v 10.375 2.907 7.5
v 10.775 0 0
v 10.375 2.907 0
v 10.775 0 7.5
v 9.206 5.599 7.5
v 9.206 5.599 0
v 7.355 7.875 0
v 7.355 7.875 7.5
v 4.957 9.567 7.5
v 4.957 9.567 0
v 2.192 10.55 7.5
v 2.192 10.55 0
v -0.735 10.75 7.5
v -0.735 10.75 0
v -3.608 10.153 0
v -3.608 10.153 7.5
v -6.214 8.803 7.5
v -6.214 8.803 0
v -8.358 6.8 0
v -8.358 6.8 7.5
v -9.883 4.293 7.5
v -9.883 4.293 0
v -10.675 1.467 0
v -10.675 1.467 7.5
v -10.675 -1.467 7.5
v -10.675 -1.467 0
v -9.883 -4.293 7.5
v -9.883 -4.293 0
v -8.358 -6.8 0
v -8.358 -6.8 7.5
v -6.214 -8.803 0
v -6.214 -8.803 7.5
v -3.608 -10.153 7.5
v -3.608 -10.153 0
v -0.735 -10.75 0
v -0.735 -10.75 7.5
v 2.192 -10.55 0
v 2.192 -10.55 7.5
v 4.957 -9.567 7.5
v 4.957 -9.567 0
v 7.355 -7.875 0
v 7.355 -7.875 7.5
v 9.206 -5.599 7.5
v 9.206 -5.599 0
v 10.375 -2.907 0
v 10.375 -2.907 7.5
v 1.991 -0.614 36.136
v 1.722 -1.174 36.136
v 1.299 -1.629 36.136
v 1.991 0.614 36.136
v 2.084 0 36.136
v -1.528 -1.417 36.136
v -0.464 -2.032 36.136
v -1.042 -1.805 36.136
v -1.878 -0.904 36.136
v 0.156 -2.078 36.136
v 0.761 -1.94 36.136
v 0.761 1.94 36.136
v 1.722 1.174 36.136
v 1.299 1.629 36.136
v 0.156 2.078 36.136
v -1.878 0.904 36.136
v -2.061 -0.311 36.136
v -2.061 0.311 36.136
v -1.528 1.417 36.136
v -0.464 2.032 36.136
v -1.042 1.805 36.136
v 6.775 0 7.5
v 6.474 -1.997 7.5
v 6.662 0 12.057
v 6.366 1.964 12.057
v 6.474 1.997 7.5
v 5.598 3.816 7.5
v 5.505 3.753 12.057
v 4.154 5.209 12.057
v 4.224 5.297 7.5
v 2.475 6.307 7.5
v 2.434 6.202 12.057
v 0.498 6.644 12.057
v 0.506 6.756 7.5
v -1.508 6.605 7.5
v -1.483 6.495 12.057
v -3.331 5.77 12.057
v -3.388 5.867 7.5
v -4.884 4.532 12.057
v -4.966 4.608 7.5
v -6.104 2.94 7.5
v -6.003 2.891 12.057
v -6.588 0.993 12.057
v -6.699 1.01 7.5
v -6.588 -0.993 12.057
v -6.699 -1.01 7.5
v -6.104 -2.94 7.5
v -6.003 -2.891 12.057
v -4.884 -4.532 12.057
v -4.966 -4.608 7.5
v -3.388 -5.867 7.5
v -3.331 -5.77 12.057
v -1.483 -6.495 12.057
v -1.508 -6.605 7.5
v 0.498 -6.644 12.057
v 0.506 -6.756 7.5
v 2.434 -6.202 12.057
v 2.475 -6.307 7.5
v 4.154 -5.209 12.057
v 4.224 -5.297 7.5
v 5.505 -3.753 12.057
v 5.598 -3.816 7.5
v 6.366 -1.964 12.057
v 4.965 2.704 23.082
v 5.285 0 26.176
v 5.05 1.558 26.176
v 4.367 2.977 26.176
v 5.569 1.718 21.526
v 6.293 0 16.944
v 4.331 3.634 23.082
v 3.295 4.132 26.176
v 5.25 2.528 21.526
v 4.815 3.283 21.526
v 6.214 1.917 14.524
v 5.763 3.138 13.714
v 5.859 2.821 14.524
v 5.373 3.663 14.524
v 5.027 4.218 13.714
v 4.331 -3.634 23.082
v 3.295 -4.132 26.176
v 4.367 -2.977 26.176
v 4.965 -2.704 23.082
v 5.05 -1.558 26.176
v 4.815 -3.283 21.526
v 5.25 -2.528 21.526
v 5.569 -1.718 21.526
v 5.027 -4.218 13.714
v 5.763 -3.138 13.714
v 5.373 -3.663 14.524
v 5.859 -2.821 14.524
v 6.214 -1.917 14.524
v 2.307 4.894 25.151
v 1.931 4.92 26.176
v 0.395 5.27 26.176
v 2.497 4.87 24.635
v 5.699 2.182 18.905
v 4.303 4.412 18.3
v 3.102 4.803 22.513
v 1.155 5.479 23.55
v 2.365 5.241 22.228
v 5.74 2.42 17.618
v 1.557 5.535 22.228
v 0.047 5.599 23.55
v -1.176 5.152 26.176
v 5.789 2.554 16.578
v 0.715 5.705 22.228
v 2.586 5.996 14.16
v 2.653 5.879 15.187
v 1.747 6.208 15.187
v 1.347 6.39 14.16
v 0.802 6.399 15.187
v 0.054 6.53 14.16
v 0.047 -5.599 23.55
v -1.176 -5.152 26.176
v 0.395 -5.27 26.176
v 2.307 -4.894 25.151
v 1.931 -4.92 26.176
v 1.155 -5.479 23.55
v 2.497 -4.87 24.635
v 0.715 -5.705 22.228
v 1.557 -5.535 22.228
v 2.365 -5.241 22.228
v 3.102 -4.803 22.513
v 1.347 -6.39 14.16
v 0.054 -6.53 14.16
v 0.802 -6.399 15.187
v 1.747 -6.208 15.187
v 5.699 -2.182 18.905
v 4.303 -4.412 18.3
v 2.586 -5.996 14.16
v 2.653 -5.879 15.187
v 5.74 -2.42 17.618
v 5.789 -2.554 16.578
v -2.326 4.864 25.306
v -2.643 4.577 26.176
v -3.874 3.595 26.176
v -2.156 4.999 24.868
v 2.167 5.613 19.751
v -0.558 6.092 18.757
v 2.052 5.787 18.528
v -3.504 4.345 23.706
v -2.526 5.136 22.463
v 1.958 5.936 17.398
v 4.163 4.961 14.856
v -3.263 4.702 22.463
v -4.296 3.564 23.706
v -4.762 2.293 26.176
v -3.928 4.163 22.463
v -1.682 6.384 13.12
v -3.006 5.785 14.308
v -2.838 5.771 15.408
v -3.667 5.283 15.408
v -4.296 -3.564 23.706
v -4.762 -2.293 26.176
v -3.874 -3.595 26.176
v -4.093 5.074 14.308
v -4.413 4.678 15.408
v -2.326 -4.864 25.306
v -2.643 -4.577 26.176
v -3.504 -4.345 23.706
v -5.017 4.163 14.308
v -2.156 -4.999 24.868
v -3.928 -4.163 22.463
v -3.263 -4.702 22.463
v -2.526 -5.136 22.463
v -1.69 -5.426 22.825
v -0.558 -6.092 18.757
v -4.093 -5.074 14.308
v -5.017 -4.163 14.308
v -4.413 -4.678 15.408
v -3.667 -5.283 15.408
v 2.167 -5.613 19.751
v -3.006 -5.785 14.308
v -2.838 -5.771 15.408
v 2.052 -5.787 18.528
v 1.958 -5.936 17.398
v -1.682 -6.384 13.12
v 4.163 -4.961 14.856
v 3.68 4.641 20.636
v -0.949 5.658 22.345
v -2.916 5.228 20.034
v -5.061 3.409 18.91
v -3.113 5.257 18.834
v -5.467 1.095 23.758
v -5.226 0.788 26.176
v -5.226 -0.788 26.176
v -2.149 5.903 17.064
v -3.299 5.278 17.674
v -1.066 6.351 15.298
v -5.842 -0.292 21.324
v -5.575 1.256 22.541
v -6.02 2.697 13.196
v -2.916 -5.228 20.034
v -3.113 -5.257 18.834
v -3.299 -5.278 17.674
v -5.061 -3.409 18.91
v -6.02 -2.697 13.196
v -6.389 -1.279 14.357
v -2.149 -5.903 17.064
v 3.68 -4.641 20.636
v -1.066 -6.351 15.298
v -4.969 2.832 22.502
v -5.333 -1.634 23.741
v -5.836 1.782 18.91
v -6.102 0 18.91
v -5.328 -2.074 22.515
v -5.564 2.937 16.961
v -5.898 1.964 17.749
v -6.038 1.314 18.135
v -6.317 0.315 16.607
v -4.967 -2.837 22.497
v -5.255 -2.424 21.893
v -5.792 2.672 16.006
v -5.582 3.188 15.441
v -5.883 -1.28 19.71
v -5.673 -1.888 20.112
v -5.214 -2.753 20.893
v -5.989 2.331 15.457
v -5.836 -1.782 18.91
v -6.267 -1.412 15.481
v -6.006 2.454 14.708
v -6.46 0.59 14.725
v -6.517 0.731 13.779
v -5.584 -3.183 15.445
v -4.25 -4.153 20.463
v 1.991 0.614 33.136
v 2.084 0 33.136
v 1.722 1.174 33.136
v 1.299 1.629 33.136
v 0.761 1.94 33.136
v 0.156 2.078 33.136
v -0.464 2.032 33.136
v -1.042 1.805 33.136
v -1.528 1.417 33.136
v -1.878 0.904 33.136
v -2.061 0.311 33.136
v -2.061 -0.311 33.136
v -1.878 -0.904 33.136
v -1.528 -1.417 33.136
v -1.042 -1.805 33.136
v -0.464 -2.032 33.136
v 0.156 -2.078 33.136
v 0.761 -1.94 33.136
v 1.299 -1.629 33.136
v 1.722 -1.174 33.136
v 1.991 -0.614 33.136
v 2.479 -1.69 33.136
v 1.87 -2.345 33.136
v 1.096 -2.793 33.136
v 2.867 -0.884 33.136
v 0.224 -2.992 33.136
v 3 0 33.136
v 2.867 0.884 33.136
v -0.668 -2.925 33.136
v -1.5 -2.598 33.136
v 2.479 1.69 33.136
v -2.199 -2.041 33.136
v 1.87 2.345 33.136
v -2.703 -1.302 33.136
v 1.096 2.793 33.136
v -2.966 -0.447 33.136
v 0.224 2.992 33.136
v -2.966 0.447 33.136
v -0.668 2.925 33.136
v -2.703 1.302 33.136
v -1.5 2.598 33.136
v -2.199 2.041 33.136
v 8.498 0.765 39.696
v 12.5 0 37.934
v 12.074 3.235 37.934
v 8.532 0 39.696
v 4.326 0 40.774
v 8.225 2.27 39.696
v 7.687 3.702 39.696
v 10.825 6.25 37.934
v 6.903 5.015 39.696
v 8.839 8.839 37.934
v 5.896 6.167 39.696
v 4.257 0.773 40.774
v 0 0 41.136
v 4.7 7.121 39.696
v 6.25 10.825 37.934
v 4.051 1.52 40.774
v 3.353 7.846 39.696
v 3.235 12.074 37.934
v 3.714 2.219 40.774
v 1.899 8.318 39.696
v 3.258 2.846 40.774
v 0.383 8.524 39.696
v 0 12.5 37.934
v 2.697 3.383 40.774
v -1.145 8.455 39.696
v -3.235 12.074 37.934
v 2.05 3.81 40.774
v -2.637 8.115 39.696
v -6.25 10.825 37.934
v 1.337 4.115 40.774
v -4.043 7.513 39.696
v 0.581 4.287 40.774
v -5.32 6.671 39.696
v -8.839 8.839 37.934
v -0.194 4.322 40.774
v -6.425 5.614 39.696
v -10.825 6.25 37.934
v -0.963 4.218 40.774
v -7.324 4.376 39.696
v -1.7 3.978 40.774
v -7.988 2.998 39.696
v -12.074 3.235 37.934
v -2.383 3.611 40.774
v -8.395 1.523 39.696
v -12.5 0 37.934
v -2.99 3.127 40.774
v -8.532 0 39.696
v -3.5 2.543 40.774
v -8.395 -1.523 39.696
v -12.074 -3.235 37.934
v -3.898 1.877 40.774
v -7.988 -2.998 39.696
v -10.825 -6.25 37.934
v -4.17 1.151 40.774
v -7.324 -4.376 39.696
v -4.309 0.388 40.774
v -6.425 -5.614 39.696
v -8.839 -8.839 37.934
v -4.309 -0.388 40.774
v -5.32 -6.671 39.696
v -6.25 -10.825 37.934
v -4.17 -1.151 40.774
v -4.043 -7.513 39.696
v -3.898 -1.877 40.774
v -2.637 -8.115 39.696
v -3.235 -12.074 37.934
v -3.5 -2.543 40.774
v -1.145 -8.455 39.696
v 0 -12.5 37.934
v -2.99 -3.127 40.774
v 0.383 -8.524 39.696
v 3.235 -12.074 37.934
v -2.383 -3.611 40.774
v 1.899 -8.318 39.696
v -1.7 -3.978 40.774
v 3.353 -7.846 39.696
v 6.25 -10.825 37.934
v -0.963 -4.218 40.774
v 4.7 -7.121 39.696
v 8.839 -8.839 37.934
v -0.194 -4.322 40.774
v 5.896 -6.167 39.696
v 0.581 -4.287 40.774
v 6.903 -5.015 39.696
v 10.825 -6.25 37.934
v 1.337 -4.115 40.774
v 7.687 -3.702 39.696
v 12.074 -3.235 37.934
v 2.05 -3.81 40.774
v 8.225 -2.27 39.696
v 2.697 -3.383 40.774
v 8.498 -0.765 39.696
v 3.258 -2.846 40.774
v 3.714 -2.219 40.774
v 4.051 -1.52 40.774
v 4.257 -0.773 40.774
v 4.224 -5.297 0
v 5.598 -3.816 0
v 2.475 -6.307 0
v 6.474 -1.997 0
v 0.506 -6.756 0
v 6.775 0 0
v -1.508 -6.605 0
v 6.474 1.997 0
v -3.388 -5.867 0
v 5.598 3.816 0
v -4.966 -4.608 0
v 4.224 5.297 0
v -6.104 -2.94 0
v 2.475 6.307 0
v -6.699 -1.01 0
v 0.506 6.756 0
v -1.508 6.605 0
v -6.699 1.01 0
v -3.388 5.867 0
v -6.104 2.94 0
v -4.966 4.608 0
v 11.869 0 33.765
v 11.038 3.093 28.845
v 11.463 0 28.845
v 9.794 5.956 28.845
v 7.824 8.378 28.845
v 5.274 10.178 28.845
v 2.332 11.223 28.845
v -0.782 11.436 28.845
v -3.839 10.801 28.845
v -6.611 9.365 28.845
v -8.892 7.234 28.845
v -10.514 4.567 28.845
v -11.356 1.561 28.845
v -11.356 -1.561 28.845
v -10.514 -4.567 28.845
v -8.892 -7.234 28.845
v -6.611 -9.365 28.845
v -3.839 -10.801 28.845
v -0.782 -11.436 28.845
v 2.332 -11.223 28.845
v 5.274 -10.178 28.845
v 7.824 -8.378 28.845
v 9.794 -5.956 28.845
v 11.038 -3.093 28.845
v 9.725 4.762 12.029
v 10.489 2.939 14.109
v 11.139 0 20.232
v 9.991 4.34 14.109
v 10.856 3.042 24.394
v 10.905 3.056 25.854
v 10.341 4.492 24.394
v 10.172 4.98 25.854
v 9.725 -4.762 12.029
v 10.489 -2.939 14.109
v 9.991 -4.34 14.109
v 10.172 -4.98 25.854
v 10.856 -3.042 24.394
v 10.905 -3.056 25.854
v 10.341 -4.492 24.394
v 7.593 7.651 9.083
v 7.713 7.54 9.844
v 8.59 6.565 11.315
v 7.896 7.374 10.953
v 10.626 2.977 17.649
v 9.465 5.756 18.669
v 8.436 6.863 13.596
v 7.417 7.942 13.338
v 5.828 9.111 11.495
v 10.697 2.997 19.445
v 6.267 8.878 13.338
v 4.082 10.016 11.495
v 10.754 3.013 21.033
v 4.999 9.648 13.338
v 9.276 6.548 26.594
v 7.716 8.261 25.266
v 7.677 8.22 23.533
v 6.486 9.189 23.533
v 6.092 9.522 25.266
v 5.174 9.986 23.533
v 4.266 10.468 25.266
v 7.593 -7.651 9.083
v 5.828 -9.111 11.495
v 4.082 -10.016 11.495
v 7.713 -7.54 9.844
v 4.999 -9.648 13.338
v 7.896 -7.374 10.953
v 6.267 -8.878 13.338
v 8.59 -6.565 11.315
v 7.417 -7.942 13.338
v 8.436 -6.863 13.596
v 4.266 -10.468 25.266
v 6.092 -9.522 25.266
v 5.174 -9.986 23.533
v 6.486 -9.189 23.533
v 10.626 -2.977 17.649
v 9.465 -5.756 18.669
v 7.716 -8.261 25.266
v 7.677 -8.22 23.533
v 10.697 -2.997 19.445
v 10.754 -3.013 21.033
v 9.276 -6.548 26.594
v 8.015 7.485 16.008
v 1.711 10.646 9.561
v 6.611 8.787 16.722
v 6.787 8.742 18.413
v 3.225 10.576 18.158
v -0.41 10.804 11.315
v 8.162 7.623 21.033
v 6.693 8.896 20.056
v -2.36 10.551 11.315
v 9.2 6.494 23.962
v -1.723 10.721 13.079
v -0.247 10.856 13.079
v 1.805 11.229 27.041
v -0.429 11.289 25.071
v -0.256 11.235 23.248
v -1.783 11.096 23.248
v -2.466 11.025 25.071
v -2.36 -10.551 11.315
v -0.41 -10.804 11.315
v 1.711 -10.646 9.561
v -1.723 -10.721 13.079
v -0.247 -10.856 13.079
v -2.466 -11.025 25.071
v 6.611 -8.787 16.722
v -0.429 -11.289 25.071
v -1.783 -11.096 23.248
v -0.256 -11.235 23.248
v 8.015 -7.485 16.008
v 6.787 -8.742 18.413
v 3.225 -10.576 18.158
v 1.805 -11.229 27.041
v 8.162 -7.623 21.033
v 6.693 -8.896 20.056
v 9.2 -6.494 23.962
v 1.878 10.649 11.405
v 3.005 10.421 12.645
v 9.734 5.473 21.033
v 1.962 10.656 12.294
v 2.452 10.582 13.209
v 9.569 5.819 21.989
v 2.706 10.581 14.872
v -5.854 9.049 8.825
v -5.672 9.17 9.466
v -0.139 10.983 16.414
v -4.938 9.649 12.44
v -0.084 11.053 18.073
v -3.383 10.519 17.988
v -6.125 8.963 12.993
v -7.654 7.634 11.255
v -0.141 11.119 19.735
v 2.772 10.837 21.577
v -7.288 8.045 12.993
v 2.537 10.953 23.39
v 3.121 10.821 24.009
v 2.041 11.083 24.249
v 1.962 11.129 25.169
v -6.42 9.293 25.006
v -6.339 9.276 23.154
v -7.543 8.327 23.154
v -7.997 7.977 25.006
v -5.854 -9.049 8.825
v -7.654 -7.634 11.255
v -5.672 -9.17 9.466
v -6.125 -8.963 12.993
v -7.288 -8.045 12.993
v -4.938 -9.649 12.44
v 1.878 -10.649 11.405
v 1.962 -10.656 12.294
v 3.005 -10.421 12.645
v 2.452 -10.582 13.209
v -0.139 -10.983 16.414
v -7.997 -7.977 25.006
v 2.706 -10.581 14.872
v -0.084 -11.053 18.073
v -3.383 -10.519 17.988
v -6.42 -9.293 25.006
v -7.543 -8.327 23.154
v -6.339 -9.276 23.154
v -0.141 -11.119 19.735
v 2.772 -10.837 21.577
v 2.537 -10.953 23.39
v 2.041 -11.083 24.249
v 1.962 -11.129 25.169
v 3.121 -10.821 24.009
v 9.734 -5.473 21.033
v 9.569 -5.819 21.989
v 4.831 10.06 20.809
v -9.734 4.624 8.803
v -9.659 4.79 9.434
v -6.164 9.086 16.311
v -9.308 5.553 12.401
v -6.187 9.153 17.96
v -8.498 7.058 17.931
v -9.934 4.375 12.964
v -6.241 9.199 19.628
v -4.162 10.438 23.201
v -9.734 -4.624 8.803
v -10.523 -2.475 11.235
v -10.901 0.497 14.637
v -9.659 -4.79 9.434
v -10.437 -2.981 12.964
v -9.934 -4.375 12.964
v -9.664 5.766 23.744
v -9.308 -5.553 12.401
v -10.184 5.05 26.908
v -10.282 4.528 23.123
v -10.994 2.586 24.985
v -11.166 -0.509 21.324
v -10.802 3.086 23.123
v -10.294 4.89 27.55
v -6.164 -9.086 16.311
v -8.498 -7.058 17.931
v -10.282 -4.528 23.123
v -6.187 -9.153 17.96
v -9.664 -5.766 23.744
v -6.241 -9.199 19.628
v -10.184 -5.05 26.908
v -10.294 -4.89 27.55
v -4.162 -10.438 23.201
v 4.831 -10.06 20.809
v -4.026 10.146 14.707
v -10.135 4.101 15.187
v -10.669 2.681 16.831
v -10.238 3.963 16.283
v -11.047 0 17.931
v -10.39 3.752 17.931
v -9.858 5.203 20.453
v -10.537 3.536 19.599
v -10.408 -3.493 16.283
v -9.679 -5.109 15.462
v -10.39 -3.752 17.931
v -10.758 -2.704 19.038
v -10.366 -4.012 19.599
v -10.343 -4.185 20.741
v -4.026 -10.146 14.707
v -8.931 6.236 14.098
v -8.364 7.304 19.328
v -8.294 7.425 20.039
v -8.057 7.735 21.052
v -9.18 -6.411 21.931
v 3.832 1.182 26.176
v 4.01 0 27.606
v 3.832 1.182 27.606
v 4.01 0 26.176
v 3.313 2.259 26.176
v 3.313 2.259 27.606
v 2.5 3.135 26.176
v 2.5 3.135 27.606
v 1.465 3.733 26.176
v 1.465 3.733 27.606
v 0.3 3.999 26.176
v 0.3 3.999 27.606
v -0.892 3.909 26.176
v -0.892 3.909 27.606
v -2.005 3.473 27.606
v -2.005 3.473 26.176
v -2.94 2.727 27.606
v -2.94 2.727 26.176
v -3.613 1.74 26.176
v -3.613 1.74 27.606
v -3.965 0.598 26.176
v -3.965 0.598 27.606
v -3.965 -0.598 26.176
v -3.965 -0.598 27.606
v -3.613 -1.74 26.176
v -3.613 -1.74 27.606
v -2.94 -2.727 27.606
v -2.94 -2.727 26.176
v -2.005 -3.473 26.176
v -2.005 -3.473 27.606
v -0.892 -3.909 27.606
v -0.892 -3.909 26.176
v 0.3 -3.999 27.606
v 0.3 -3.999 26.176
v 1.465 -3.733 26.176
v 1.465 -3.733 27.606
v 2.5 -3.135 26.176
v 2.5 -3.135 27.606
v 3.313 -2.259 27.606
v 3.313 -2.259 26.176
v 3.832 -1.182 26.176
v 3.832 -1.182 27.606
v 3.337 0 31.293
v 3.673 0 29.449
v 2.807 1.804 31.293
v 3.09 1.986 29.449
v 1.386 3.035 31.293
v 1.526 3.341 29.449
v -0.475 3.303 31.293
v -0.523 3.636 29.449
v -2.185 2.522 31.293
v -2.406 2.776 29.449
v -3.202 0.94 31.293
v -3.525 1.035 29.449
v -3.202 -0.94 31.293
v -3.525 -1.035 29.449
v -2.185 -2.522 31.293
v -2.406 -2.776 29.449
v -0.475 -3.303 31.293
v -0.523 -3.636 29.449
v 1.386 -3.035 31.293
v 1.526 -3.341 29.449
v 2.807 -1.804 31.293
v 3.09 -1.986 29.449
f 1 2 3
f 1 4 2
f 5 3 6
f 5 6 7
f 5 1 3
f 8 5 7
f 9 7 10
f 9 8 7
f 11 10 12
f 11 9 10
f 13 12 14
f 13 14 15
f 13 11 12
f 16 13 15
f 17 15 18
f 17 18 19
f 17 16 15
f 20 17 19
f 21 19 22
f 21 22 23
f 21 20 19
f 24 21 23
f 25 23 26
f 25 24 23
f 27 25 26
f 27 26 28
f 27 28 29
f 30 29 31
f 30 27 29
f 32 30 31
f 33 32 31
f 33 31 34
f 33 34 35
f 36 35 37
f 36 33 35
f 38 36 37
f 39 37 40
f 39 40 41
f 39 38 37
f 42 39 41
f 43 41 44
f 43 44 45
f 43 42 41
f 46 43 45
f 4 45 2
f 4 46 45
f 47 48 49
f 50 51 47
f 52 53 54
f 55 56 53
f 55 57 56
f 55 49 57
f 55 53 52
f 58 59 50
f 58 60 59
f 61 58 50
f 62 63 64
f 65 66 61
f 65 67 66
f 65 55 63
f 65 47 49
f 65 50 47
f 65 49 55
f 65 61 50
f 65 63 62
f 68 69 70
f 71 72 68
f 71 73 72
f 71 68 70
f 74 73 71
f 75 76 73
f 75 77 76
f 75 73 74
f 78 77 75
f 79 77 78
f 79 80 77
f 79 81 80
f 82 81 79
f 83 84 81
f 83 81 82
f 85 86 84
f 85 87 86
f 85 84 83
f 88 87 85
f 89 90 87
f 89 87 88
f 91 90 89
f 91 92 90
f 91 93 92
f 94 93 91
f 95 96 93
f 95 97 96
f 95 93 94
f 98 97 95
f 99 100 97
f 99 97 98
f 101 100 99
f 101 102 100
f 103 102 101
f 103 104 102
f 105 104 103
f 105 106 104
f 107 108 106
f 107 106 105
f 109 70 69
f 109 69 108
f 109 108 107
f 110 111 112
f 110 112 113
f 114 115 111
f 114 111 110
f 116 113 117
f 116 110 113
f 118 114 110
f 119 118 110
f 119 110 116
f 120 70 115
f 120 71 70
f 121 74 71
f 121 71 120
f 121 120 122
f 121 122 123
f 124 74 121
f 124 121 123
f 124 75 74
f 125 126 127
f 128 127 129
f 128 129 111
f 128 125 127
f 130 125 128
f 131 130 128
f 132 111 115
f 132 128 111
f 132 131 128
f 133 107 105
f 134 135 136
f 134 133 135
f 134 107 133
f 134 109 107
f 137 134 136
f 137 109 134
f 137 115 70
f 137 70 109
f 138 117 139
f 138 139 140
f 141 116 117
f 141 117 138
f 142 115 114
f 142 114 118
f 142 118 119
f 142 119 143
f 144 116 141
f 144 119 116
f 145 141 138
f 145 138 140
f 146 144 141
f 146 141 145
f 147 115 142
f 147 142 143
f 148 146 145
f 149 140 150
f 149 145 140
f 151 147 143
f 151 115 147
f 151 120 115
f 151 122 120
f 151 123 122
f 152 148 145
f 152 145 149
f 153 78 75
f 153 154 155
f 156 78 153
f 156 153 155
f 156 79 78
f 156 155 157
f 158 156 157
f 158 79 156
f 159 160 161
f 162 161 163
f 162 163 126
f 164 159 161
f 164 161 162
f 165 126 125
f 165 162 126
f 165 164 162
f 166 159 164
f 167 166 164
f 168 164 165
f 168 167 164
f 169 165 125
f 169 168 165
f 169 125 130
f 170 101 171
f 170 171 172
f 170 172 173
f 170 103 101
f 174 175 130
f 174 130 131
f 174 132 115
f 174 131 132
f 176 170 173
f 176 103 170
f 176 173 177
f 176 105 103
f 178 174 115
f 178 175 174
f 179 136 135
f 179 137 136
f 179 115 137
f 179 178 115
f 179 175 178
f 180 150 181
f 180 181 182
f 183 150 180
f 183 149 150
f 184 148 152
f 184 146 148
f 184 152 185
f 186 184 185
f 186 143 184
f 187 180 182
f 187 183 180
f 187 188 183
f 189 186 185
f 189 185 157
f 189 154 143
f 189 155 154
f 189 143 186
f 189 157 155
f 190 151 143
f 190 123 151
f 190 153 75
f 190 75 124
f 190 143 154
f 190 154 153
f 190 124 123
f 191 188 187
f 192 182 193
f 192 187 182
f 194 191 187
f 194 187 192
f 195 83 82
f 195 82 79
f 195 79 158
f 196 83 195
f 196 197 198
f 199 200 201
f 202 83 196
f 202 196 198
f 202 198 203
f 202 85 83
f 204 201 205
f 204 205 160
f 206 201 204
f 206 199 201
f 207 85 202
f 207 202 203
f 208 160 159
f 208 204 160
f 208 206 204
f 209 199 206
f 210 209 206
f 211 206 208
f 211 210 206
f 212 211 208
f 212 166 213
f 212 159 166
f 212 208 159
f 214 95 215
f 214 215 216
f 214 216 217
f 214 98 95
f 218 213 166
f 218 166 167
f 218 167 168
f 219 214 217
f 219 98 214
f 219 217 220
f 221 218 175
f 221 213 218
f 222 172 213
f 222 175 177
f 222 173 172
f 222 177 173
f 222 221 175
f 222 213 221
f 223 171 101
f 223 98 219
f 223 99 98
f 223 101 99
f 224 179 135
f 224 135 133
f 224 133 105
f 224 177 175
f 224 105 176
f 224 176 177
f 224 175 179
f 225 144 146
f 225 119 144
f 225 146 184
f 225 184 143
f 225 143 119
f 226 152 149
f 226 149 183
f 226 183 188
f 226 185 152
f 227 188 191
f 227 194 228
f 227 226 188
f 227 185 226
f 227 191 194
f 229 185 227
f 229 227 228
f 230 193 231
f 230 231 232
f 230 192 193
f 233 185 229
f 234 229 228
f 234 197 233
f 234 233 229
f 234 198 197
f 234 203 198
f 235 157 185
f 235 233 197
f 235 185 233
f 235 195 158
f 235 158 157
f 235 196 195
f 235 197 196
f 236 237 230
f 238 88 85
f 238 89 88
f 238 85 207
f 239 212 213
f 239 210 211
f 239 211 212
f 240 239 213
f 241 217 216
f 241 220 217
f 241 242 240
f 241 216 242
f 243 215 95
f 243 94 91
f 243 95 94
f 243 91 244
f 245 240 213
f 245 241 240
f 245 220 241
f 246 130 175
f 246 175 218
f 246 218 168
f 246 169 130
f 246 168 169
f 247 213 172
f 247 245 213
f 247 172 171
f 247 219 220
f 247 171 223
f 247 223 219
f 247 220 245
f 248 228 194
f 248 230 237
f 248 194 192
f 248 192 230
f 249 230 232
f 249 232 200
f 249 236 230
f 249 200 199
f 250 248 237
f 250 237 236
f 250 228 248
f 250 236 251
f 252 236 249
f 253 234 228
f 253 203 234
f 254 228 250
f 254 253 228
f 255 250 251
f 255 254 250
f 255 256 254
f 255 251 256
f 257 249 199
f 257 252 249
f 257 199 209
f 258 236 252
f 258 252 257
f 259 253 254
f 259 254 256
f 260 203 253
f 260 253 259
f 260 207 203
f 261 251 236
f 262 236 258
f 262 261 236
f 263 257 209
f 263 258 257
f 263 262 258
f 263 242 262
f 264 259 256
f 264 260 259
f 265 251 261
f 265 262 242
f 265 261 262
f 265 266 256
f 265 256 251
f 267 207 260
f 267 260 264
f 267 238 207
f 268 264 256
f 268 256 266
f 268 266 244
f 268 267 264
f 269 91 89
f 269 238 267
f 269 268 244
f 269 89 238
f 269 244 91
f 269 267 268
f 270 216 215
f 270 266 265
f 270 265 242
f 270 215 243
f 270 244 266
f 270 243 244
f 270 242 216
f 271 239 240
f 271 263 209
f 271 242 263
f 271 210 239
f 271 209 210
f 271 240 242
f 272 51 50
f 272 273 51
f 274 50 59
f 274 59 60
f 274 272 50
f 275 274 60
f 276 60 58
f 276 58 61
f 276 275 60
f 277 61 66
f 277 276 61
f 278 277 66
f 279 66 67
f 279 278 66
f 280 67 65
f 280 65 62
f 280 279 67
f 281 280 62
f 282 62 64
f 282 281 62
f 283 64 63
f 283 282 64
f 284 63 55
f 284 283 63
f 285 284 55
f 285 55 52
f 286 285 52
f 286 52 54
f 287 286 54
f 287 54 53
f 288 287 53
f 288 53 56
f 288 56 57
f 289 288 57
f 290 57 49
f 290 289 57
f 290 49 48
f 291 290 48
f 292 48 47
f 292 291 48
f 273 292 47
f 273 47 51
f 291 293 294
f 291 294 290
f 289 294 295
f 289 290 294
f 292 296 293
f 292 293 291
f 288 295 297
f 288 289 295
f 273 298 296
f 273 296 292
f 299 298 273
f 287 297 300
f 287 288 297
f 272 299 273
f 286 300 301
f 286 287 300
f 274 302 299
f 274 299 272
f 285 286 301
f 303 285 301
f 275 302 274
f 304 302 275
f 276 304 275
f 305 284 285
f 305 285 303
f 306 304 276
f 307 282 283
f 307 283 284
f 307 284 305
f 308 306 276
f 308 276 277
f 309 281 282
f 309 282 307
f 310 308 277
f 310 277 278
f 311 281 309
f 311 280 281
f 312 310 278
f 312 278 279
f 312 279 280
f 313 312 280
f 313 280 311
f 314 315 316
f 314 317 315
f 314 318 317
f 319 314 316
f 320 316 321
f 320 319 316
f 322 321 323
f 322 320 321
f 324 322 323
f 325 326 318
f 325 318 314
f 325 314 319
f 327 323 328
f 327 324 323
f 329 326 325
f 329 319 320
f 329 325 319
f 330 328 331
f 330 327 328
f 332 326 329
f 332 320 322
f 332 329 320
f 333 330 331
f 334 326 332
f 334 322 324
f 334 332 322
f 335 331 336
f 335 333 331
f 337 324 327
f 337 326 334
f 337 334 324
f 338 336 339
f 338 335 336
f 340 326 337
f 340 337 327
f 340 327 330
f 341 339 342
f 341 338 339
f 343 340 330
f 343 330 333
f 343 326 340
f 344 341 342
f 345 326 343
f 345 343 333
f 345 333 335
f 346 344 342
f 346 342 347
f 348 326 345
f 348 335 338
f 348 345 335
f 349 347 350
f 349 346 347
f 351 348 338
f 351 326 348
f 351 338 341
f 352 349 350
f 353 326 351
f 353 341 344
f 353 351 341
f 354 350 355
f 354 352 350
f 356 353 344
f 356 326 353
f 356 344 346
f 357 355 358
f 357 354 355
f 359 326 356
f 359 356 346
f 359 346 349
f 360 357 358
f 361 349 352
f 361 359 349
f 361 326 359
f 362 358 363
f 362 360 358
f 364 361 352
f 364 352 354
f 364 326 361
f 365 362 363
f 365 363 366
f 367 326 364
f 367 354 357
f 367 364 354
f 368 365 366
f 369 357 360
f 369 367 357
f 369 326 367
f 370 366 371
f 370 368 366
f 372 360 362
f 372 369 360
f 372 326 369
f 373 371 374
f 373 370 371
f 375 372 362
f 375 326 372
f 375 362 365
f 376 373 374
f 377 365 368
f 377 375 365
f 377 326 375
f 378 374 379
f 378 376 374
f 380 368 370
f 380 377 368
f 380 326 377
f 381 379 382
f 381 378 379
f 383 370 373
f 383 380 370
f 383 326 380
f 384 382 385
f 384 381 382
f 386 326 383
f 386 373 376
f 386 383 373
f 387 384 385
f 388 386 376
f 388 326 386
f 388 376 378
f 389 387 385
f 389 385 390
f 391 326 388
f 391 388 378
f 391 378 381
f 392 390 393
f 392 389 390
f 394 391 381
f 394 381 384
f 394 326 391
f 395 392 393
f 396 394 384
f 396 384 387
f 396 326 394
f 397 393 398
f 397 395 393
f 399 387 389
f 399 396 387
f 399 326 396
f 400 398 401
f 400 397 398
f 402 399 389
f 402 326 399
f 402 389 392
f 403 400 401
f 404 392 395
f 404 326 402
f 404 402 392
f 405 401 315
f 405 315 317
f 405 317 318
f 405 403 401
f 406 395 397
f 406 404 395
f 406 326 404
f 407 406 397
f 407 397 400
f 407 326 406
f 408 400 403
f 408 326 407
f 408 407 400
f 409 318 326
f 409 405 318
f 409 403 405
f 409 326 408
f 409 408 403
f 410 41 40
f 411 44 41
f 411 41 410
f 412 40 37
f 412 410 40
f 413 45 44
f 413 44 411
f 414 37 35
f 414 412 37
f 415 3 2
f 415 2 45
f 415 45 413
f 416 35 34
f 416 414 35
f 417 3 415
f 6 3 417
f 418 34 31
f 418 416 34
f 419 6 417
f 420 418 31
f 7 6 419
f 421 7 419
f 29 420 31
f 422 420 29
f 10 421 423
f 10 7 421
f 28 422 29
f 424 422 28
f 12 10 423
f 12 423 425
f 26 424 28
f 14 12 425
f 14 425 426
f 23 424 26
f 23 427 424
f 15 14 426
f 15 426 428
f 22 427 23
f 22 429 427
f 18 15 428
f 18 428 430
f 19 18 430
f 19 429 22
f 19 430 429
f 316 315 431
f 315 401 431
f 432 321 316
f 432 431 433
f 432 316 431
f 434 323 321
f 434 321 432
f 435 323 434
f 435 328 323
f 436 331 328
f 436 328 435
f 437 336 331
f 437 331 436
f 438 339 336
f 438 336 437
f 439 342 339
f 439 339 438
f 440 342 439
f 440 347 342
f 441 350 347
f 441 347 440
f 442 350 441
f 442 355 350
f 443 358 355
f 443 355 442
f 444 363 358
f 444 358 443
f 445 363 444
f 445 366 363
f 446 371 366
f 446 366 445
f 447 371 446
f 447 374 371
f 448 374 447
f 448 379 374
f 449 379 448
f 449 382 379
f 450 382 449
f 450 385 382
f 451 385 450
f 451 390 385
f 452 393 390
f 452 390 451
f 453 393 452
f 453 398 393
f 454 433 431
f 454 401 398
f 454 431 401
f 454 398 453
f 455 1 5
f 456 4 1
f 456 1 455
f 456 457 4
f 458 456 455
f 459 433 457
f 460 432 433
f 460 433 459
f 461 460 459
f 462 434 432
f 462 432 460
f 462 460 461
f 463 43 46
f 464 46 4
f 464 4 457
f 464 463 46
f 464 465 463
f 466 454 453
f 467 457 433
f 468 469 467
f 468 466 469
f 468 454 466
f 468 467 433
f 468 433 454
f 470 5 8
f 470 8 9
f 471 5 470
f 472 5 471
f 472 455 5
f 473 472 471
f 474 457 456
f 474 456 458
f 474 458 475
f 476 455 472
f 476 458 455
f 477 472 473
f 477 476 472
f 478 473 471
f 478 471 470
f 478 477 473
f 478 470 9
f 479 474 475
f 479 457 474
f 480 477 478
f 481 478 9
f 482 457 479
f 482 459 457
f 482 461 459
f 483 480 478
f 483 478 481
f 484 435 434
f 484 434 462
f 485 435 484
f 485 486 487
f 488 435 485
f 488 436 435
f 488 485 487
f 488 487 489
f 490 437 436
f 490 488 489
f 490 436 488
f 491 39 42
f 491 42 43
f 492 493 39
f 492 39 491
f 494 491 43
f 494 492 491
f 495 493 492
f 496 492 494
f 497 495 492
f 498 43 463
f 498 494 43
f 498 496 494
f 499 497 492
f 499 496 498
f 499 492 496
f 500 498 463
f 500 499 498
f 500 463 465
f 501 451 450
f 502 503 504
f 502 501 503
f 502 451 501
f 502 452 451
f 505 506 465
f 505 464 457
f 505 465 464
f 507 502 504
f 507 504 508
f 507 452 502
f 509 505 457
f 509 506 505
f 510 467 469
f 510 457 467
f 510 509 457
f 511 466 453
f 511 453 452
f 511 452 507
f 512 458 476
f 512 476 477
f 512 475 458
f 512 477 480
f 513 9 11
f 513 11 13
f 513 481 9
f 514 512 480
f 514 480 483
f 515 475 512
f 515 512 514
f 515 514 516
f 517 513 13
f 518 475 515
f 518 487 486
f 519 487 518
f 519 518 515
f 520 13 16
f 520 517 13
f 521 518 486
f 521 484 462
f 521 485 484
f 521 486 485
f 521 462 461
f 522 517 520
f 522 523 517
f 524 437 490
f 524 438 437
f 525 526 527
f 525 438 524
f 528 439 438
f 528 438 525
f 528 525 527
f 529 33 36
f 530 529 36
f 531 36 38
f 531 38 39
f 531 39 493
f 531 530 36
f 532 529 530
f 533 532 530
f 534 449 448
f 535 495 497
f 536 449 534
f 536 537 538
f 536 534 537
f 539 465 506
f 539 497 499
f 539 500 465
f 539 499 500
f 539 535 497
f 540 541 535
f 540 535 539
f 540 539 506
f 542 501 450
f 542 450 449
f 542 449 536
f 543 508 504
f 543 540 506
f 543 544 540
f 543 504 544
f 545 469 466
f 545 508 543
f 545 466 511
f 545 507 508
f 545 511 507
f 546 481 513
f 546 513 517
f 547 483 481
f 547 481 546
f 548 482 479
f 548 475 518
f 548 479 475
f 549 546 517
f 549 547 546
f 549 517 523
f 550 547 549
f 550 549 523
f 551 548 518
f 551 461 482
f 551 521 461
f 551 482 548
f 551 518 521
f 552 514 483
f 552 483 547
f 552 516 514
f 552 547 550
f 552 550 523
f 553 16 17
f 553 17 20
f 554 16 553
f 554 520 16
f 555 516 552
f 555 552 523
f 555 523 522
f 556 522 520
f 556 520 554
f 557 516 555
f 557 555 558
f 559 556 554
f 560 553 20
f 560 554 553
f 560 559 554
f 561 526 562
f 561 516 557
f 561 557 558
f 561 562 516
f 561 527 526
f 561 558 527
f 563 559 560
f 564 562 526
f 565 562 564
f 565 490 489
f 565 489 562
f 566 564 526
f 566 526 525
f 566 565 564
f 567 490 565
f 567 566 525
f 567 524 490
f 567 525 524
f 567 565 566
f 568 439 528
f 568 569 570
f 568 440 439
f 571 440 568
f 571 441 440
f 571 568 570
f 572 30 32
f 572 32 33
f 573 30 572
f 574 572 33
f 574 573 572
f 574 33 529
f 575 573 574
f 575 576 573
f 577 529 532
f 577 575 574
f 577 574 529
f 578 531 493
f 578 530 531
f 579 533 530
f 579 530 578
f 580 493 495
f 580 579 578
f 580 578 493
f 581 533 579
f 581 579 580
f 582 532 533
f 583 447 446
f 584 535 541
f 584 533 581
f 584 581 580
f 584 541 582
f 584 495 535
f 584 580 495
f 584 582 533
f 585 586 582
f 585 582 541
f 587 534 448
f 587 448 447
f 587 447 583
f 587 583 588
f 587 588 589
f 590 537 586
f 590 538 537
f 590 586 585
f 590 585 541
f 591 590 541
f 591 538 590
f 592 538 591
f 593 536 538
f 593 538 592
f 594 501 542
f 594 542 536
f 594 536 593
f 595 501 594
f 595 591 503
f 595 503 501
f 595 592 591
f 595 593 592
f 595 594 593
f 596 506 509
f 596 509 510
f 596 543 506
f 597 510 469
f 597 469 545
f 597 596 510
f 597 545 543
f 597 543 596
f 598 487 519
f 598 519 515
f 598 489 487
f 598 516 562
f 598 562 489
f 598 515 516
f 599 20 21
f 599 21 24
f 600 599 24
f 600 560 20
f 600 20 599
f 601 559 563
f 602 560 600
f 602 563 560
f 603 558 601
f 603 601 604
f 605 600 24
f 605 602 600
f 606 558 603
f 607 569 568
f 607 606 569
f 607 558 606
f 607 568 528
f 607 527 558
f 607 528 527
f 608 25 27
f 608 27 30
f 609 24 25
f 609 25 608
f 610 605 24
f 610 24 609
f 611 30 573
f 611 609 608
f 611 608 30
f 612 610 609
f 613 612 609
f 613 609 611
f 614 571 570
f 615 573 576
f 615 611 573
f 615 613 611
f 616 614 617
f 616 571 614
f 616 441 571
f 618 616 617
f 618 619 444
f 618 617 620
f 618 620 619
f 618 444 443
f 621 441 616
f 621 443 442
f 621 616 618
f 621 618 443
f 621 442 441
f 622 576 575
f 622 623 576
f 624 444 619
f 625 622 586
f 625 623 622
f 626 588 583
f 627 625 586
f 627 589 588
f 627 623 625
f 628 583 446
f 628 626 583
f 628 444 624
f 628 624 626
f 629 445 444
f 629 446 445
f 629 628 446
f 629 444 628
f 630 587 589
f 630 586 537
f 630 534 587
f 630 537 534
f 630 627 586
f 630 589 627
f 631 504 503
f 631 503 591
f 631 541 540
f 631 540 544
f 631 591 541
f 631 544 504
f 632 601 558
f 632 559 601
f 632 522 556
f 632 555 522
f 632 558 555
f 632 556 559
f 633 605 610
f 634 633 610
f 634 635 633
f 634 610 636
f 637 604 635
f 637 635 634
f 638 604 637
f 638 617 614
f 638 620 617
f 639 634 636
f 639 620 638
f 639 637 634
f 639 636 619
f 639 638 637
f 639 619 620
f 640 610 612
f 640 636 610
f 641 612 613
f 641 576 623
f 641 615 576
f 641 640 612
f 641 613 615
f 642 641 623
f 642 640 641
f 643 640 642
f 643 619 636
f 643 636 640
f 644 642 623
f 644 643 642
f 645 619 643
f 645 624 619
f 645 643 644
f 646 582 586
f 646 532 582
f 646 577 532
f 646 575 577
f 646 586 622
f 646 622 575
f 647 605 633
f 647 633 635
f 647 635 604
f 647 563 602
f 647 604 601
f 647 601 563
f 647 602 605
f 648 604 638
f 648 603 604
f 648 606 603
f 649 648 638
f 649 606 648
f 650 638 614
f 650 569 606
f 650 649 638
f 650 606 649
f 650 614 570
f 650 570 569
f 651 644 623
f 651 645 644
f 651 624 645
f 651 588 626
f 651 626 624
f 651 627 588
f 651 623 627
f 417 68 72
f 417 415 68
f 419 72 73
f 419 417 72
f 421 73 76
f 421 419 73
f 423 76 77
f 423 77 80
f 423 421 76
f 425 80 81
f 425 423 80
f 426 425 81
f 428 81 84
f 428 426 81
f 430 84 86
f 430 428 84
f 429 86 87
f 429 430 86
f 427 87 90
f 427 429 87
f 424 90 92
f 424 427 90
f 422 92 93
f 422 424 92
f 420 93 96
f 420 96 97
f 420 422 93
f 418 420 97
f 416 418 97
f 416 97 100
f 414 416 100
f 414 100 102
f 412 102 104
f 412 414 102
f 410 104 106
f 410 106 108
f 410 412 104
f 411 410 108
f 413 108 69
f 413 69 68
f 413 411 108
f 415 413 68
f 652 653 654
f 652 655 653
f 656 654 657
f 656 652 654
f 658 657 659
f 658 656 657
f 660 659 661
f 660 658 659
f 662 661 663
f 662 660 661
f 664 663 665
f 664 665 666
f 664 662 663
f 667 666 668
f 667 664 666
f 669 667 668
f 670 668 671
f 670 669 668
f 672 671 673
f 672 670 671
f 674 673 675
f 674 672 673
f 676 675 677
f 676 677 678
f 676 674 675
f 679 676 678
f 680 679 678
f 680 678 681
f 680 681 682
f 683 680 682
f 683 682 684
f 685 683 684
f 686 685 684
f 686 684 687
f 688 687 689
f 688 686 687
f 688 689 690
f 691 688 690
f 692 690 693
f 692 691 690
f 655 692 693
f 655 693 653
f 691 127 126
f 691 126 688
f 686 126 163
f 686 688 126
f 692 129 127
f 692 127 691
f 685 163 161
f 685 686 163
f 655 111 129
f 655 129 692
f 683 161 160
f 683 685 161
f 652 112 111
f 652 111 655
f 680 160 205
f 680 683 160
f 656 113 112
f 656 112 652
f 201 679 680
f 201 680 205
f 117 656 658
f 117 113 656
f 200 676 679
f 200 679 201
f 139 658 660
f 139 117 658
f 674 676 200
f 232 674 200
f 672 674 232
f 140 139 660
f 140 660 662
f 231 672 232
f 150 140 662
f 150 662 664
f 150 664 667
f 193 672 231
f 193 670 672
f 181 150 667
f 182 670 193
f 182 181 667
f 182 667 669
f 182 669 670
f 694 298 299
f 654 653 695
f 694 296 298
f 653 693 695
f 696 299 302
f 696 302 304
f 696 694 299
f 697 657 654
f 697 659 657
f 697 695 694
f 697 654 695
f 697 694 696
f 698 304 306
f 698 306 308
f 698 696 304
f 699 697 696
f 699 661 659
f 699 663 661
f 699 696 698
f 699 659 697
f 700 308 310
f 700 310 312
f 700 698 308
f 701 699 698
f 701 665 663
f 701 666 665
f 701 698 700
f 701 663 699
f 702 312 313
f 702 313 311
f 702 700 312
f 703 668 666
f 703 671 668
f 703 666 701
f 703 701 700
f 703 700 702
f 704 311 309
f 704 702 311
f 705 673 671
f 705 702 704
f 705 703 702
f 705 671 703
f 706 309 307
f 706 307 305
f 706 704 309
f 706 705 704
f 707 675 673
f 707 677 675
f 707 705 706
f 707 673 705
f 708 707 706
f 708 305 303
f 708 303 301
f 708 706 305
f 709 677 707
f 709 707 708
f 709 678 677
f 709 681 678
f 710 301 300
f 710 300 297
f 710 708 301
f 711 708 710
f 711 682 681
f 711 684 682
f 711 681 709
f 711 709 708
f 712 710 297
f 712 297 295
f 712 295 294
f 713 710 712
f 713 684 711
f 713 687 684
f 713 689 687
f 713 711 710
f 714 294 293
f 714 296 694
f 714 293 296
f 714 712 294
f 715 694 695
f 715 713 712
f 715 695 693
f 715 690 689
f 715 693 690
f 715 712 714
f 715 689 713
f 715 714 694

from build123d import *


with BuildPart() as f1:
    # F0 (on Front) → F1 (revolve)
    with BuildSketch(Plane.XZ):
        with BuildLine():
            Line((6.775, 7.5), (6.775, 0))
            Line((6.775, 0), (10.775, 0))
            Line((10.775, 0), (10.775, 7.5))
            add(Edge.make_bspline(
                [(10.775, 7.5), (10.7607568159, 12.6796716145), (11.2885719403, 20.6449525893), (11.405192979, 32.3101136547), (12.5, 37.9340262304)],
                knots=[0, 0, 0, 0, 0.4716343176, 1, 1, 1, 1], degree=3))
            ThreePointArc((12.5, 37.9340262304), (6.451795022, 40.3227890172), (0, 41.136))
            Line((0, 41.136), (0, 36.136))
            Line((0, 36.136), (2.084, 36.136))
            Line((2.084, 36.136), (2.084, 33.136))
            Line((2.084, 33.136), (3, 33.136))
            Line((3, 33.136), (4.01, 27.606))
            Line((4.01, 27.606), (4.01, 26.176))
            Line((4.01, 26.176), (5.285, 26.176))
            add(Edge.make_bspline(
                [(5.285, 26.176), (5.6616569155, 23.1410889995), (6.363038423, 16.7434815213), (6.7755435593, 11.2503249571), (6.775, 7.5)],
                knots=[0, 0, 0, 0, 0.4956782544, 1, 1, 1, 1], degree=3))
        make_face()
    revolve(axis=Axis((0, 0, 38.636), (0, 0, 1)))


solid = f1.part
